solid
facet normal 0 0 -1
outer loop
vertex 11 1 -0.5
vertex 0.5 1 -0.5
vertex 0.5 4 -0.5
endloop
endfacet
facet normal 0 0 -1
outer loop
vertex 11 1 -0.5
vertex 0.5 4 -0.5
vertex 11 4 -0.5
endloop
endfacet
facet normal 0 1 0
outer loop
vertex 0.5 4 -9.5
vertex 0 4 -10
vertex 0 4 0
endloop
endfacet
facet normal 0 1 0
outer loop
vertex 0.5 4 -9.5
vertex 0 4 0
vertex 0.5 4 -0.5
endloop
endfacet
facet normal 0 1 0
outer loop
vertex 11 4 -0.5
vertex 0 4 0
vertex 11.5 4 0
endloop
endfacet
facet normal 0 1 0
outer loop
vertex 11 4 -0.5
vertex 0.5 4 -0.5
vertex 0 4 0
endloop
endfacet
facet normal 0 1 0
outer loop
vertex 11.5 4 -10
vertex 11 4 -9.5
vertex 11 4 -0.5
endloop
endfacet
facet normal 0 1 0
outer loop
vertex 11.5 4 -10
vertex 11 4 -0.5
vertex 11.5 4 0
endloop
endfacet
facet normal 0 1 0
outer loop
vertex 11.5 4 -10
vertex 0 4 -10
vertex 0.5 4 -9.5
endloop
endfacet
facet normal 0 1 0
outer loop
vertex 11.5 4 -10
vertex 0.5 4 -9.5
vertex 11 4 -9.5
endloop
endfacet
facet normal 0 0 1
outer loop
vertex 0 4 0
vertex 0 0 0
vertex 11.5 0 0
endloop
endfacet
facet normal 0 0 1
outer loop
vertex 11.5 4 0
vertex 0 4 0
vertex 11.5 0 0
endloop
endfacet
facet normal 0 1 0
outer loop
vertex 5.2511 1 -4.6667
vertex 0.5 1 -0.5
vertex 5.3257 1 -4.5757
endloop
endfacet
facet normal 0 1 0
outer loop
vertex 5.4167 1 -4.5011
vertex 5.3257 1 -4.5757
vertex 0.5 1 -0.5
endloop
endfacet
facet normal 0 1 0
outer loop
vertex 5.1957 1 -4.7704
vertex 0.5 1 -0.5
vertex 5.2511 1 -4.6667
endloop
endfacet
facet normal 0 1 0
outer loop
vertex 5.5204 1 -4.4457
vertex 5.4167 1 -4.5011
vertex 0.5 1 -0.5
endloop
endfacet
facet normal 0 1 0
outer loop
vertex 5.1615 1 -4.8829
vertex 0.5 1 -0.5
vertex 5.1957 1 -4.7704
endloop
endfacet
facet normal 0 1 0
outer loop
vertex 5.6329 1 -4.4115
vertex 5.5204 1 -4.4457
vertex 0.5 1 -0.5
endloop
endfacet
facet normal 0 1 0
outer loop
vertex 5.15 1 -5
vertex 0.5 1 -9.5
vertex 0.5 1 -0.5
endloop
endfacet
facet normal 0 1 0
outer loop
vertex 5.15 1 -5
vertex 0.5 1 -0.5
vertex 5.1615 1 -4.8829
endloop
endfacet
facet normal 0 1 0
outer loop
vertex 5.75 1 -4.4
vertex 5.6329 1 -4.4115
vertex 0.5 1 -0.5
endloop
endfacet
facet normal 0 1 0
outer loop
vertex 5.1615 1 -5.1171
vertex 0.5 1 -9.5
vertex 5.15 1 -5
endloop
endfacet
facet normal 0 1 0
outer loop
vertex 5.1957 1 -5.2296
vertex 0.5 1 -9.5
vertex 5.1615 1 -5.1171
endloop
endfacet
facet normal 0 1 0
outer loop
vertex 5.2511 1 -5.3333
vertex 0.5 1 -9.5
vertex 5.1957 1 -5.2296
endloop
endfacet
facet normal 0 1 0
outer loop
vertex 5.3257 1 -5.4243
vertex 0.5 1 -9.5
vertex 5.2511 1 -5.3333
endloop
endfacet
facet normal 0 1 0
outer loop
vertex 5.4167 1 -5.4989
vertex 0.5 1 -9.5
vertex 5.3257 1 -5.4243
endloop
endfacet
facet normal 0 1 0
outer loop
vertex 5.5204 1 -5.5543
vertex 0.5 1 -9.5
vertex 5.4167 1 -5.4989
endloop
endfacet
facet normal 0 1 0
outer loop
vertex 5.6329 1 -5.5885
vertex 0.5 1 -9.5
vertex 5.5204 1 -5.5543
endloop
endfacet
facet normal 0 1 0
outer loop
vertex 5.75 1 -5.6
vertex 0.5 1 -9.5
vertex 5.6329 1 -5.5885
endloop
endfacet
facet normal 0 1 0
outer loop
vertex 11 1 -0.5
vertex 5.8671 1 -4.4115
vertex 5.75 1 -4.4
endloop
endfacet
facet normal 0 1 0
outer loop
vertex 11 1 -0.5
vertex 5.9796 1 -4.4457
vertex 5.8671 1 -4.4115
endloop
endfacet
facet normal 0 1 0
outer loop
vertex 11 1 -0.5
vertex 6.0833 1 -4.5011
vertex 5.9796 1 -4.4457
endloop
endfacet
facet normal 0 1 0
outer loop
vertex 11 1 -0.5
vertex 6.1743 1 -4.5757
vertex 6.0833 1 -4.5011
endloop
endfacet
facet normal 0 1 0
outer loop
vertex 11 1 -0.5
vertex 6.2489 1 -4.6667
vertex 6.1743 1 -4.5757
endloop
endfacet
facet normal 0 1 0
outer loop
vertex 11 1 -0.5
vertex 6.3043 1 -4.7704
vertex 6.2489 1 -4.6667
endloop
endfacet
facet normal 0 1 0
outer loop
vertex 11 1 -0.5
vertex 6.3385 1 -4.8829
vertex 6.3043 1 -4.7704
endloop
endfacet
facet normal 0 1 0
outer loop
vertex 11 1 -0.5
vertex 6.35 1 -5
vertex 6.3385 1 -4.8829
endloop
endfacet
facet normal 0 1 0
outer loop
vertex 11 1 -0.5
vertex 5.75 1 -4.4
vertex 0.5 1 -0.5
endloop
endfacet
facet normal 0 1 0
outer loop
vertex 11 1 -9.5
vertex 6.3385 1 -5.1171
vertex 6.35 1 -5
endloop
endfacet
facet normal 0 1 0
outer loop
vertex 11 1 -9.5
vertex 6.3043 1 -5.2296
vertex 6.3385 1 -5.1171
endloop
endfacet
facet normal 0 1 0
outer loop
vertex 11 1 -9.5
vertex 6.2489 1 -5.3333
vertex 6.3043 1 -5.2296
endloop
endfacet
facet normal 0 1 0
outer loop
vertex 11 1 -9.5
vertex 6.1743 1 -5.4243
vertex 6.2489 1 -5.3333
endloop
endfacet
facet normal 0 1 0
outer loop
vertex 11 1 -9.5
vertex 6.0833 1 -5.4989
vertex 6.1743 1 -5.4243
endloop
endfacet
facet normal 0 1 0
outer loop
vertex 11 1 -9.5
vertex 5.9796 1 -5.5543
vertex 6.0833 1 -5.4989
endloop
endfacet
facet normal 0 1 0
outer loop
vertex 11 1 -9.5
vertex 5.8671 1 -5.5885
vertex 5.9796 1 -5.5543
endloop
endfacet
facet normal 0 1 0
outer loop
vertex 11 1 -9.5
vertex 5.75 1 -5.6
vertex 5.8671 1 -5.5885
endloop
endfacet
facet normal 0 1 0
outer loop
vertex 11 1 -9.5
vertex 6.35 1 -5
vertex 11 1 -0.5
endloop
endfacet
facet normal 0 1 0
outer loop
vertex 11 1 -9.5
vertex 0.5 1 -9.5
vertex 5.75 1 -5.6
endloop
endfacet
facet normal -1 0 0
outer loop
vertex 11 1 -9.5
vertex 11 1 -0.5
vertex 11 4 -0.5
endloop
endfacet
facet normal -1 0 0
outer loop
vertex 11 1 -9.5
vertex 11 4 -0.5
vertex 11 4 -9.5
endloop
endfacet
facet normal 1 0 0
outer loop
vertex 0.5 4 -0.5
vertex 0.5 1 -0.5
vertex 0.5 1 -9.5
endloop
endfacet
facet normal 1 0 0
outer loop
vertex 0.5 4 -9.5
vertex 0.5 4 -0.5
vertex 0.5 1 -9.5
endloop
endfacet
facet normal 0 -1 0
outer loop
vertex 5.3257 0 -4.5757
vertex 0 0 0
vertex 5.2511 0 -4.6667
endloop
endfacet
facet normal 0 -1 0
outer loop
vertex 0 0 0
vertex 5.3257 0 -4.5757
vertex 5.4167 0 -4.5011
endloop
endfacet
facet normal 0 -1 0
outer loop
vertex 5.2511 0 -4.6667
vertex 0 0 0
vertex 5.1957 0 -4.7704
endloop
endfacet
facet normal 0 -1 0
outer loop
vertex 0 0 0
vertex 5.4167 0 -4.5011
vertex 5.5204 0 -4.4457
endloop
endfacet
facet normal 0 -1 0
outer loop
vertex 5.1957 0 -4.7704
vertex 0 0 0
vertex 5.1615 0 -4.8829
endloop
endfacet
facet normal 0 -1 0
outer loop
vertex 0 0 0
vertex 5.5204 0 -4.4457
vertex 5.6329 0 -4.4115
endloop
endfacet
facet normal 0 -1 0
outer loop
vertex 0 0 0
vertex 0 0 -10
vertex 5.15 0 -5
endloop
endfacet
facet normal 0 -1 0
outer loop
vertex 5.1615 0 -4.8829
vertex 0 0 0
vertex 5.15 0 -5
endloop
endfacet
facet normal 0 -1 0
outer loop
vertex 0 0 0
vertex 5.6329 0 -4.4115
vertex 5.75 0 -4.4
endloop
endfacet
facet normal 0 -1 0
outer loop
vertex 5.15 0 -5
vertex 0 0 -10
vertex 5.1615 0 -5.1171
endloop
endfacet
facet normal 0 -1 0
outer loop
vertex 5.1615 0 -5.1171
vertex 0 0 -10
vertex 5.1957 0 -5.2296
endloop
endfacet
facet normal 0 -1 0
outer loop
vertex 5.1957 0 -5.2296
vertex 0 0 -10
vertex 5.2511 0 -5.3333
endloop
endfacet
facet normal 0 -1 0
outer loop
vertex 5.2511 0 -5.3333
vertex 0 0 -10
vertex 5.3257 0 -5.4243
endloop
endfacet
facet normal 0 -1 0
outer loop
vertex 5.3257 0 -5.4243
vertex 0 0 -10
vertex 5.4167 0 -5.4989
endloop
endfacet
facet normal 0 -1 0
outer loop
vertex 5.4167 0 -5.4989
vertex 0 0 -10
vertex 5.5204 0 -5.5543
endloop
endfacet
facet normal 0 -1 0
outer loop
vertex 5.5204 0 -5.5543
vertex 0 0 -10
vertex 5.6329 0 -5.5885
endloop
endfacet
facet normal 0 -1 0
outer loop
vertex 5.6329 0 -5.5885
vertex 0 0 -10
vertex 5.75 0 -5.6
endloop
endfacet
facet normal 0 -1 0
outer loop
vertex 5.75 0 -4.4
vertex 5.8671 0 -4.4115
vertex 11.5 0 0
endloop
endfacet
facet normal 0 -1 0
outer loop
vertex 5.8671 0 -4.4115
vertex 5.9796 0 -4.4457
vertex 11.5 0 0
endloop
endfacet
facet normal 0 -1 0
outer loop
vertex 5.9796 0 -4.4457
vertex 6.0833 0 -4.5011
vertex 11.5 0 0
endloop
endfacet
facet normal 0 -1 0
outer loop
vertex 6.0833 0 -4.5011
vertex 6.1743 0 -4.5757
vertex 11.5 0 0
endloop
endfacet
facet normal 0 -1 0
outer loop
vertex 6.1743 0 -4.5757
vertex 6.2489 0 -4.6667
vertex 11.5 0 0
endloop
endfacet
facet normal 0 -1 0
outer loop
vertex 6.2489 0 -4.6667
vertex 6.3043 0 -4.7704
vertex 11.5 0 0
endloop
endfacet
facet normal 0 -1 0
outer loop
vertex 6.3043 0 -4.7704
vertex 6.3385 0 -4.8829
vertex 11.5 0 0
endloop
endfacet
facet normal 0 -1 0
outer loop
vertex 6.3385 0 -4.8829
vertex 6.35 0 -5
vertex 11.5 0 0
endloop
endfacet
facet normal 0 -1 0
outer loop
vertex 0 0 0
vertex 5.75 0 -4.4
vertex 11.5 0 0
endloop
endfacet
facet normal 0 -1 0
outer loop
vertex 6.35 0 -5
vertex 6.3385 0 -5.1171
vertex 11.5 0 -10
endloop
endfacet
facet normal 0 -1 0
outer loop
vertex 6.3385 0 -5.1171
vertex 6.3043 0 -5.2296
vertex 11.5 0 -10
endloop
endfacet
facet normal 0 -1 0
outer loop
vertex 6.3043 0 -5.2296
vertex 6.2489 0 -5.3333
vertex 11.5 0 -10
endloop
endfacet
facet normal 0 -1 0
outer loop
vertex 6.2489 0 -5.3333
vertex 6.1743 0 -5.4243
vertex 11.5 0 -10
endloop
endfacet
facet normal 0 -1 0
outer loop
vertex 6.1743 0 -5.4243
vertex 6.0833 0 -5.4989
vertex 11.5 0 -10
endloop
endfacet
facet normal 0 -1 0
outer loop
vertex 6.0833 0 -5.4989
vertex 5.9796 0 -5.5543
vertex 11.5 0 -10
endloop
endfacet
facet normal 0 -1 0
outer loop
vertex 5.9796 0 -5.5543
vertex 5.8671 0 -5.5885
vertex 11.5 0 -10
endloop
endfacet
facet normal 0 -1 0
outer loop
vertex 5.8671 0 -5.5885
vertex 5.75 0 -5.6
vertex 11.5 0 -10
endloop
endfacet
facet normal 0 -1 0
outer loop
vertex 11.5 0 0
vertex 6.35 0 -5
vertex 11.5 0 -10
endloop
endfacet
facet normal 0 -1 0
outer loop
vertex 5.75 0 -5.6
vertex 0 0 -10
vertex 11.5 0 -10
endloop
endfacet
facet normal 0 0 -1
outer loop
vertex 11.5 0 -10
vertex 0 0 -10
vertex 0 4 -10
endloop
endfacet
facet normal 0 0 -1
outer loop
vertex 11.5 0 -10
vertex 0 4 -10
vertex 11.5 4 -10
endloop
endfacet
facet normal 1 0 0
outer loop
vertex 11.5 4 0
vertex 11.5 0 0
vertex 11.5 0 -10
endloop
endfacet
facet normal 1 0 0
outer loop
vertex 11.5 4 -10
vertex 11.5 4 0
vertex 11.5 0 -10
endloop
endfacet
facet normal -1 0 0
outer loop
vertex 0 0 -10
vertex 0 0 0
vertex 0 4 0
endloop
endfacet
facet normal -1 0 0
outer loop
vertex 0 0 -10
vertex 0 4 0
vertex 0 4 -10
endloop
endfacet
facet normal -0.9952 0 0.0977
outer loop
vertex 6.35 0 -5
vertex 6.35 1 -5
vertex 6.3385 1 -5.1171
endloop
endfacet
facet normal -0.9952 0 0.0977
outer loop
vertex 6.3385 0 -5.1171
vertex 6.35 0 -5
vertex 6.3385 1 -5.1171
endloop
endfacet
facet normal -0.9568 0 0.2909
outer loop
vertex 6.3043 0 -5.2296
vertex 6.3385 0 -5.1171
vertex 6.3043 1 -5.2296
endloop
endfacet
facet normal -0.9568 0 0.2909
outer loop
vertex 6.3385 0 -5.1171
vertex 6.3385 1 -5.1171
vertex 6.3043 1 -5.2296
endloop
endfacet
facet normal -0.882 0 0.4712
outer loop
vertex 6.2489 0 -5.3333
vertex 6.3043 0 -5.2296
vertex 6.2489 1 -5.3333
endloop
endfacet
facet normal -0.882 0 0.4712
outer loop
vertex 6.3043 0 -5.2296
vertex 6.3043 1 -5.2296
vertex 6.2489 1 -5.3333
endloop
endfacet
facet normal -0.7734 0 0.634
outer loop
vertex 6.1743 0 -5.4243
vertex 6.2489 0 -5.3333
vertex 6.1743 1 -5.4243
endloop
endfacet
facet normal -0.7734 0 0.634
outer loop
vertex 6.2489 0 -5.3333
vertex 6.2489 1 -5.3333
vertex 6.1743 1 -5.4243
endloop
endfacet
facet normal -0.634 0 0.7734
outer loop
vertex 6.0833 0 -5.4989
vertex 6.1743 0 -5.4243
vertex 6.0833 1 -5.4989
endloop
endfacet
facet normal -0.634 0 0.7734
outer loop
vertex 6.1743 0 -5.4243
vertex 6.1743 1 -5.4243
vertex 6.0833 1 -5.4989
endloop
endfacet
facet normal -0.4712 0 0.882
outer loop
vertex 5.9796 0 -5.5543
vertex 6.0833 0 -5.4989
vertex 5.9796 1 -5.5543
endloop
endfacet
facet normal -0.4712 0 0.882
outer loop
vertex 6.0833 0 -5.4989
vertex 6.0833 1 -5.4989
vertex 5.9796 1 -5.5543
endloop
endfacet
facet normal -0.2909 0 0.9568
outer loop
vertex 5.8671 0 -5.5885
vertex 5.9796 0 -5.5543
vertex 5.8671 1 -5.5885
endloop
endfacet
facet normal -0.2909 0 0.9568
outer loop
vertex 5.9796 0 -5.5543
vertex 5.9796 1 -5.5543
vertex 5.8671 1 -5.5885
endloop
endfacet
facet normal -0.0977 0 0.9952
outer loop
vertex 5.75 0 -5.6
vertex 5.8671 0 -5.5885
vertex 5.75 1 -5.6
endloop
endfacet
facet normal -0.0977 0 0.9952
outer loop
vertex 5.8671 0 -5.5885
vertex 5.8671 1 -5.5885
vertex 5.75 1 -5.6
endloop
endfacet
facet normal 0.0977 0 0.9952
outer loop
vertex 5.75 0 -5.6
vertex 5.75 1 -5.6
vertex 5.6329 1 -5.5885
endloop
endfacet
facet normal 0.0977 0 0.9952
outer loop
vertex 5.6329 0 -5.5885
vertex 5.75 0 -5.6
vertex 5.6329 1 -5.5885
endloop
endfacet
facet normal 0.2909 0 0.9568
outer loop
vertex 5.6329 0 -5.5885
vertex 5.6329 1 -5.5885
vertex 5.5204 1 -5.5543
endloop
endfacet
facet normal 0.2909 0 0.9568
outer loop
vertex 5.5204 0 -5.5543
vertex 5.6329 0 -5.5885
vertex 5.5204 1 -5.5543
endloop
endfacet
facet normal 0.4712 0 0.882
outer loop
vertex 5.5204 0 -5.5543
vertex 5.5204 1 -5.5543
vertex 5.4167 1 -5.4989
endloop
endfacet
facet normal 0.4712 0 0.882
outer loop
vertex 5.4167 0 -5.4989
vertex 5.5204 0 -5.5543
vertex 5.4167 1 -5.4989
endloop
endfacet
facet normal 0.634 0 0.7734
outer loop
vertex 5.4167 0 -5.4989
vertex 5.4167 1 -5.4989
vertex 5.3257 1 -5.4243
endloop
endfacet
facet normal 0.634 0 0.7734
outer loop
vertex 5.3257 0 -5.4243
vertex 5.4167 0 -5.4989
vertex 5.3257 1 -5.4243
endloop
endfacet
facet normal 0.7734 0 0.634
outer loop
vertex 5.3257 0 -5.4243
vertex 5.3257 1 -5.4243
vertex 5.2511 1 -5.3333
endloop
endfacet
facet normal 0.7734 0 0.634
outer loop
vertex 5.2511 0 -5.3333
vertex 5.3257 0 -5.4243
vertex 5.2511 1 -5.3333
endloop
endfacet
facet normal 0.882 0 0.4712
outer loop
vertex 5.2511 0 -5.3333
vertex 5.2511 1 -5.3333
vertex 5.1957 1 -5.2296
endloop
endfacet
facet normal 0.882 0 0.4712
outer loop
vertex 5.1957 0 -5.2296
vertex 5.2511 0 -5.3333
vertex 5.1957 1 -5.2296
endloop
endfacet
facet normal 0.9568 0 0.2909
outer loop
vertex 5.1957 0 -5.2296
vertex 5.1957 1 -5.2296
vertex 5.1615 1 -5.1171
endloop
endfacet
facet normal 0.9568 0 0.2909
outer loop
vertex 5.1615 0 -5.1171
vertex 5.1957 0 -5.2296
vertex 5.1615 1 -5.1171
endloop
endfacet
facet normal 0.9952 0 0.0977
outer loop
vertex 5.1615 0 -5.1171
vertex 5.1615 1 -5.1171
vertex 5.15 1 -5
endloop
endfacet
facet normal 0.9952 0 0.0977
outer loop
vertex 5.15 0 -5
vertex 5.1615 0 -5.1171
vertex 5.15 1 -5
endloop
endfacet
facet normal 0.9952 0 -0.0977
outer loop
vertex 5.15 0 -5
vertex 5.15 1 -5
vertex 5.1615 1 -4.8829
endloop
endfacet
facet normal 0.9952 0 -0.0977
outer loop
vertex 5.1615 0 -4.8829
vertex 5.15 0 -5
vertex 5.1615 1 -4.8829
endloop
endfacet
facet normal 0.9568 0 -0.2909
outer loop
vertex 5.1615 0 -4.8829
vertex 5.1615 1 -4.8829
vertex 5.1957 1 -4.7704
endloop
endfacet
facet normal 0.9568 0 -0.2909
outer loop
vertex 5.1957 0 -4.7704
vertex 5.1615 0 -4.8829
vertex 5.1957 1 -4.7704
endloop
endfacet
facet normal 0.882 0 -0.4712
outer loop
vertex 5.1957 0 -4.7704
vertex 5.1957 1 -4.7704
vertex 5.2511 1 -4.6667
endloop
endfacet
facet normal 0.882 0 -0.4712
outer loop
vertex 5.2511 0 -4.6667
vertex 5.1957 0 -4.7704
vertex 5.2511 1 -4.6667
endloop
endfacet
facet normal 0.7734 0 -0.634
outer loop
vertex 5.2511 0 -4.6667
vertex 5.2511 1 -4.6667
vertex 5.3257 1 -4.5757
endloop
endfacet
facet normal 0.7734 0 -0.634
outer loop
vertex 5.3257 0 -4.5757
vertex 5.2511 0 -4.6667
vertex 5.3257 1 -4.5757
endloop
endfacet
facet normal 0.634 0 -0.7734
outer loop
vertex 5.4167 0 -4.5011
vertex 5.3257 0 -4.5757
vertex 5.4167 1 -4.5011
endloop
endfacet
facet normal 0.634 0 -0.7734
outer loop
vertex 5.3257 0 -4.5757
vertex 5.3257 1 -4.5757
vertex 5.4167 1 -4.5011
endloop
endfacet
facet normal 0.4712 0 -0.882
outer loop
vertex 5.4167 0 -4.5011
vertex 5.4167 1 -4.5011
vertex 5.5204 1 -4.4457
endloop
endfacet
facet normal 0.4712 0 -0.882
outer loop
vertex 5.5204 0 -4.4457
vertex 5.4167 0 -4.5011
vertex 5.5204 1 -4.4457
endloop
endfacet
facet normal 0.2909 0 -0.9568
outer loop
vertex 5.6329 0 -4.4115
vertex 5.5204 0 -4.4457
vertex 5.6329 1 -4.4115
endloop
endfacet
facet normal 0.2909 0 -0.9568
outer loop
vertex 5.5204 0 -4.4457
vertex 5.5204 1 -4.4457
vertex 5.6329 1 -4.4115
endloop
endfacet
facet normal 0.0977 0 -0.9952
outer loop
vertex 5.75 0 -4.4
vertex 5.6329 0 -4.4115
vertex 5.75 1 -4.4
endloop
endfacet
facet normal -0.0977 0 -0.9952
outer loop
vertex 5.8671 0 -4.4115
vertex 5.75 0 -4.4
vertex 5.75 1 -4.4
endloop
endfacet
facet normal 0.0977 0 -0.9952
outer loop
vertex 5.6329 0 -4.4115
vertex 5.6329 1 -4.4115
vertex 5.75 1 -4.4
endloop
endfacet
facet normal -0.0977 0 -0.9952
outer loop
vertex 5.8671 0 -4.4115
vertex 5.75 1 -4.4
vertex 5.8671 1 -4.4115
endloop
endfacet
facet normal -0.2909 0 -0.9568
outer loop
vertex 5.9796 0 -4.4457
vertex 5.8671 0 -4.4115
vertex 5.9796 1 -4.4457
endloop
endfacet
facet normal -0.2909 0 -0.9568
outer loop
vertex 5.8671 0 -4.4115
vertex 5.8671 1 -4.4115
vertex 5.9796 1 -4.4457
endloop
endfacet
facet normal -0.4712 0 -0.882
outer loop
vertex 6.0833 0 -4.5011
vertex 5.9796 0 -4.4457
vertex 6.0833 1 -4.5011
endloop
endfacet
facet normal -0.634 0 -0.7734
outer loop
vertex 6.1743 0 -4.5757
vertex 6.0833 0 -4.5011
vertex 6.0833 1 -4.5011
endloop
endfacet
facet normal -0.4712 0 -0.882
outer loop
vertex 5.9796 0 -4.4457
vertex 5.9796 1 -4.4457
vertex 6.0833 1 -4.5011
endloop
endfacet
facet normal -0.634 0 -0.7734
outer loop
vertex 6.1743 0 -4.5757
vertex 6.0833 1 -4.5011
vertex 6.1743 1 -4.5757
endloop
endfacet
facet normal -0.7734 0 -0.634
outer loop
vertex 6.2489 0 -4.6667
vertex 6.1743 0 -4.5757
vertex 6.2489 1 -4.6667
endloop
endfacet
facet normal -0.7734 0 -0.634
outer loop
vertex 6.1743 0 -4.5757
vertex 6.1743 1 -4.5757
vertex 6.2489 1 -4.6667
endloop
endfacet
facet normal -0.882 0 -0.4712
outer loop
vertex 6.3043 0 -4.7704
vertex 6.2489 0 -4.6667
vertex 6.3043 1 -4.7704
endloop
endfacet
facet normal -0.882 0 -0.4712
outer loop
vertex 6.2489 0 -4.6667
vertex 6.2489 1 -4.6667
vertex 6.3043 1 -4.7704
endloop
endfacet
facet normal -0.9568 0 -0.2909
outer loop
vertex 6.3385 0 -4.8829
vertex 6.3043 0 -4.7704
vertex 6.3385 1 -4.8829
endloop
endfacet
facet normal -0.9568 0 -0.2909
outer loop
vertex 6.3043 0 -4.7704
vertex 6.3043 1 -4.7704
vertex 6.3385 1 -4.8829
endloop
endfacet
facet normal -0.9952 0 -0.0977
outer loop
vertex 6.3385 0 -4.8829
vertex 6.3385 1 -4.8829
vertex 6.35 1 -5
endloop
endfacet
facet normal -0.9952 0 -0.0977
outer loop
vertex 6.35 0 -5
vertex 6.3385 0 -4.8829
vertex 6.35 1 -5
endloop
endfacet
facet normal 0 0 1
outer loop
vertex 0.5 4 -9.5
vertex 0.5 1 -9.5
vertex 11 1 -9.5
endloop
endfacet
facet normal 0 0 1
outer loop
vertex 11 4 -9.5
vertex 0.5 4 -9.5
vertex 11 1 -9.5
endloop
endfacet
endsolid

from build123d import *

# Parameters (mm, degrees)
SKETCH2_W           = 10.5
SKETCH2_H           = 9
BOSS_EXTRUDE2_DEPTH = 1
SKETCH2_3_W         = 11.5
SKETCH2_3_H         = 10
SKETCH2_3_W_2       = 10.5
SKETCH2_3_H_2       = 9
BOSS_EXTRUDE3_DEPTH = 4
SKETCH3_R           = 0.6
CUT_EXTRUDE1_DEPTH  = 10


with BuildPart() as part:
    # Sketch2 → Boss-Extrude2 (new body)
    with BuildSketch(Plane(origin=(0, 0, 0), x_dir=(1, 0, 0), z_dir=(0, 1, 0))):
        with Locations((5.75, 5)):
            Rectangle(SKETCH2_W, SKETCH2_H)
    extrude(amount=BOSS_EXTRUDE2_DEPTH)

    # Sketch2<3> → Boss-Extrude3 (add)
    with BuildSketch(Plane(origin=(0, 0, 0), x_dir=(1, 0, 0), z_dir=(0, 1, 0))):
        with Locations((5.75, 5)):
            Rectangle(SKETCH2_3_W, SKETCH2_3_H)
        with Locations((5.75, 5)):
            Rectangle(SKETCH2_3_W_2, SKETCH2_3_H_2, mode=Mode.SUBTRACT)
    extrude(amount=BOSS_EXTRUDE3_DEPTH)

    # Sketch3 → Cut-Extrude1 (cut)
    with BuildSketch(Plane(origin=(0, 1, 0), x_dir=(1, 0, 0), z_dir=(0, 1, 0))):
        with Locations((5.75, 5)):
            Circle(SKETCH3_R)
    extrude(amount=-CUT_EXTRUDE1_DEPTH, mode=Mode.SUBTRACT)


solid = part.part
